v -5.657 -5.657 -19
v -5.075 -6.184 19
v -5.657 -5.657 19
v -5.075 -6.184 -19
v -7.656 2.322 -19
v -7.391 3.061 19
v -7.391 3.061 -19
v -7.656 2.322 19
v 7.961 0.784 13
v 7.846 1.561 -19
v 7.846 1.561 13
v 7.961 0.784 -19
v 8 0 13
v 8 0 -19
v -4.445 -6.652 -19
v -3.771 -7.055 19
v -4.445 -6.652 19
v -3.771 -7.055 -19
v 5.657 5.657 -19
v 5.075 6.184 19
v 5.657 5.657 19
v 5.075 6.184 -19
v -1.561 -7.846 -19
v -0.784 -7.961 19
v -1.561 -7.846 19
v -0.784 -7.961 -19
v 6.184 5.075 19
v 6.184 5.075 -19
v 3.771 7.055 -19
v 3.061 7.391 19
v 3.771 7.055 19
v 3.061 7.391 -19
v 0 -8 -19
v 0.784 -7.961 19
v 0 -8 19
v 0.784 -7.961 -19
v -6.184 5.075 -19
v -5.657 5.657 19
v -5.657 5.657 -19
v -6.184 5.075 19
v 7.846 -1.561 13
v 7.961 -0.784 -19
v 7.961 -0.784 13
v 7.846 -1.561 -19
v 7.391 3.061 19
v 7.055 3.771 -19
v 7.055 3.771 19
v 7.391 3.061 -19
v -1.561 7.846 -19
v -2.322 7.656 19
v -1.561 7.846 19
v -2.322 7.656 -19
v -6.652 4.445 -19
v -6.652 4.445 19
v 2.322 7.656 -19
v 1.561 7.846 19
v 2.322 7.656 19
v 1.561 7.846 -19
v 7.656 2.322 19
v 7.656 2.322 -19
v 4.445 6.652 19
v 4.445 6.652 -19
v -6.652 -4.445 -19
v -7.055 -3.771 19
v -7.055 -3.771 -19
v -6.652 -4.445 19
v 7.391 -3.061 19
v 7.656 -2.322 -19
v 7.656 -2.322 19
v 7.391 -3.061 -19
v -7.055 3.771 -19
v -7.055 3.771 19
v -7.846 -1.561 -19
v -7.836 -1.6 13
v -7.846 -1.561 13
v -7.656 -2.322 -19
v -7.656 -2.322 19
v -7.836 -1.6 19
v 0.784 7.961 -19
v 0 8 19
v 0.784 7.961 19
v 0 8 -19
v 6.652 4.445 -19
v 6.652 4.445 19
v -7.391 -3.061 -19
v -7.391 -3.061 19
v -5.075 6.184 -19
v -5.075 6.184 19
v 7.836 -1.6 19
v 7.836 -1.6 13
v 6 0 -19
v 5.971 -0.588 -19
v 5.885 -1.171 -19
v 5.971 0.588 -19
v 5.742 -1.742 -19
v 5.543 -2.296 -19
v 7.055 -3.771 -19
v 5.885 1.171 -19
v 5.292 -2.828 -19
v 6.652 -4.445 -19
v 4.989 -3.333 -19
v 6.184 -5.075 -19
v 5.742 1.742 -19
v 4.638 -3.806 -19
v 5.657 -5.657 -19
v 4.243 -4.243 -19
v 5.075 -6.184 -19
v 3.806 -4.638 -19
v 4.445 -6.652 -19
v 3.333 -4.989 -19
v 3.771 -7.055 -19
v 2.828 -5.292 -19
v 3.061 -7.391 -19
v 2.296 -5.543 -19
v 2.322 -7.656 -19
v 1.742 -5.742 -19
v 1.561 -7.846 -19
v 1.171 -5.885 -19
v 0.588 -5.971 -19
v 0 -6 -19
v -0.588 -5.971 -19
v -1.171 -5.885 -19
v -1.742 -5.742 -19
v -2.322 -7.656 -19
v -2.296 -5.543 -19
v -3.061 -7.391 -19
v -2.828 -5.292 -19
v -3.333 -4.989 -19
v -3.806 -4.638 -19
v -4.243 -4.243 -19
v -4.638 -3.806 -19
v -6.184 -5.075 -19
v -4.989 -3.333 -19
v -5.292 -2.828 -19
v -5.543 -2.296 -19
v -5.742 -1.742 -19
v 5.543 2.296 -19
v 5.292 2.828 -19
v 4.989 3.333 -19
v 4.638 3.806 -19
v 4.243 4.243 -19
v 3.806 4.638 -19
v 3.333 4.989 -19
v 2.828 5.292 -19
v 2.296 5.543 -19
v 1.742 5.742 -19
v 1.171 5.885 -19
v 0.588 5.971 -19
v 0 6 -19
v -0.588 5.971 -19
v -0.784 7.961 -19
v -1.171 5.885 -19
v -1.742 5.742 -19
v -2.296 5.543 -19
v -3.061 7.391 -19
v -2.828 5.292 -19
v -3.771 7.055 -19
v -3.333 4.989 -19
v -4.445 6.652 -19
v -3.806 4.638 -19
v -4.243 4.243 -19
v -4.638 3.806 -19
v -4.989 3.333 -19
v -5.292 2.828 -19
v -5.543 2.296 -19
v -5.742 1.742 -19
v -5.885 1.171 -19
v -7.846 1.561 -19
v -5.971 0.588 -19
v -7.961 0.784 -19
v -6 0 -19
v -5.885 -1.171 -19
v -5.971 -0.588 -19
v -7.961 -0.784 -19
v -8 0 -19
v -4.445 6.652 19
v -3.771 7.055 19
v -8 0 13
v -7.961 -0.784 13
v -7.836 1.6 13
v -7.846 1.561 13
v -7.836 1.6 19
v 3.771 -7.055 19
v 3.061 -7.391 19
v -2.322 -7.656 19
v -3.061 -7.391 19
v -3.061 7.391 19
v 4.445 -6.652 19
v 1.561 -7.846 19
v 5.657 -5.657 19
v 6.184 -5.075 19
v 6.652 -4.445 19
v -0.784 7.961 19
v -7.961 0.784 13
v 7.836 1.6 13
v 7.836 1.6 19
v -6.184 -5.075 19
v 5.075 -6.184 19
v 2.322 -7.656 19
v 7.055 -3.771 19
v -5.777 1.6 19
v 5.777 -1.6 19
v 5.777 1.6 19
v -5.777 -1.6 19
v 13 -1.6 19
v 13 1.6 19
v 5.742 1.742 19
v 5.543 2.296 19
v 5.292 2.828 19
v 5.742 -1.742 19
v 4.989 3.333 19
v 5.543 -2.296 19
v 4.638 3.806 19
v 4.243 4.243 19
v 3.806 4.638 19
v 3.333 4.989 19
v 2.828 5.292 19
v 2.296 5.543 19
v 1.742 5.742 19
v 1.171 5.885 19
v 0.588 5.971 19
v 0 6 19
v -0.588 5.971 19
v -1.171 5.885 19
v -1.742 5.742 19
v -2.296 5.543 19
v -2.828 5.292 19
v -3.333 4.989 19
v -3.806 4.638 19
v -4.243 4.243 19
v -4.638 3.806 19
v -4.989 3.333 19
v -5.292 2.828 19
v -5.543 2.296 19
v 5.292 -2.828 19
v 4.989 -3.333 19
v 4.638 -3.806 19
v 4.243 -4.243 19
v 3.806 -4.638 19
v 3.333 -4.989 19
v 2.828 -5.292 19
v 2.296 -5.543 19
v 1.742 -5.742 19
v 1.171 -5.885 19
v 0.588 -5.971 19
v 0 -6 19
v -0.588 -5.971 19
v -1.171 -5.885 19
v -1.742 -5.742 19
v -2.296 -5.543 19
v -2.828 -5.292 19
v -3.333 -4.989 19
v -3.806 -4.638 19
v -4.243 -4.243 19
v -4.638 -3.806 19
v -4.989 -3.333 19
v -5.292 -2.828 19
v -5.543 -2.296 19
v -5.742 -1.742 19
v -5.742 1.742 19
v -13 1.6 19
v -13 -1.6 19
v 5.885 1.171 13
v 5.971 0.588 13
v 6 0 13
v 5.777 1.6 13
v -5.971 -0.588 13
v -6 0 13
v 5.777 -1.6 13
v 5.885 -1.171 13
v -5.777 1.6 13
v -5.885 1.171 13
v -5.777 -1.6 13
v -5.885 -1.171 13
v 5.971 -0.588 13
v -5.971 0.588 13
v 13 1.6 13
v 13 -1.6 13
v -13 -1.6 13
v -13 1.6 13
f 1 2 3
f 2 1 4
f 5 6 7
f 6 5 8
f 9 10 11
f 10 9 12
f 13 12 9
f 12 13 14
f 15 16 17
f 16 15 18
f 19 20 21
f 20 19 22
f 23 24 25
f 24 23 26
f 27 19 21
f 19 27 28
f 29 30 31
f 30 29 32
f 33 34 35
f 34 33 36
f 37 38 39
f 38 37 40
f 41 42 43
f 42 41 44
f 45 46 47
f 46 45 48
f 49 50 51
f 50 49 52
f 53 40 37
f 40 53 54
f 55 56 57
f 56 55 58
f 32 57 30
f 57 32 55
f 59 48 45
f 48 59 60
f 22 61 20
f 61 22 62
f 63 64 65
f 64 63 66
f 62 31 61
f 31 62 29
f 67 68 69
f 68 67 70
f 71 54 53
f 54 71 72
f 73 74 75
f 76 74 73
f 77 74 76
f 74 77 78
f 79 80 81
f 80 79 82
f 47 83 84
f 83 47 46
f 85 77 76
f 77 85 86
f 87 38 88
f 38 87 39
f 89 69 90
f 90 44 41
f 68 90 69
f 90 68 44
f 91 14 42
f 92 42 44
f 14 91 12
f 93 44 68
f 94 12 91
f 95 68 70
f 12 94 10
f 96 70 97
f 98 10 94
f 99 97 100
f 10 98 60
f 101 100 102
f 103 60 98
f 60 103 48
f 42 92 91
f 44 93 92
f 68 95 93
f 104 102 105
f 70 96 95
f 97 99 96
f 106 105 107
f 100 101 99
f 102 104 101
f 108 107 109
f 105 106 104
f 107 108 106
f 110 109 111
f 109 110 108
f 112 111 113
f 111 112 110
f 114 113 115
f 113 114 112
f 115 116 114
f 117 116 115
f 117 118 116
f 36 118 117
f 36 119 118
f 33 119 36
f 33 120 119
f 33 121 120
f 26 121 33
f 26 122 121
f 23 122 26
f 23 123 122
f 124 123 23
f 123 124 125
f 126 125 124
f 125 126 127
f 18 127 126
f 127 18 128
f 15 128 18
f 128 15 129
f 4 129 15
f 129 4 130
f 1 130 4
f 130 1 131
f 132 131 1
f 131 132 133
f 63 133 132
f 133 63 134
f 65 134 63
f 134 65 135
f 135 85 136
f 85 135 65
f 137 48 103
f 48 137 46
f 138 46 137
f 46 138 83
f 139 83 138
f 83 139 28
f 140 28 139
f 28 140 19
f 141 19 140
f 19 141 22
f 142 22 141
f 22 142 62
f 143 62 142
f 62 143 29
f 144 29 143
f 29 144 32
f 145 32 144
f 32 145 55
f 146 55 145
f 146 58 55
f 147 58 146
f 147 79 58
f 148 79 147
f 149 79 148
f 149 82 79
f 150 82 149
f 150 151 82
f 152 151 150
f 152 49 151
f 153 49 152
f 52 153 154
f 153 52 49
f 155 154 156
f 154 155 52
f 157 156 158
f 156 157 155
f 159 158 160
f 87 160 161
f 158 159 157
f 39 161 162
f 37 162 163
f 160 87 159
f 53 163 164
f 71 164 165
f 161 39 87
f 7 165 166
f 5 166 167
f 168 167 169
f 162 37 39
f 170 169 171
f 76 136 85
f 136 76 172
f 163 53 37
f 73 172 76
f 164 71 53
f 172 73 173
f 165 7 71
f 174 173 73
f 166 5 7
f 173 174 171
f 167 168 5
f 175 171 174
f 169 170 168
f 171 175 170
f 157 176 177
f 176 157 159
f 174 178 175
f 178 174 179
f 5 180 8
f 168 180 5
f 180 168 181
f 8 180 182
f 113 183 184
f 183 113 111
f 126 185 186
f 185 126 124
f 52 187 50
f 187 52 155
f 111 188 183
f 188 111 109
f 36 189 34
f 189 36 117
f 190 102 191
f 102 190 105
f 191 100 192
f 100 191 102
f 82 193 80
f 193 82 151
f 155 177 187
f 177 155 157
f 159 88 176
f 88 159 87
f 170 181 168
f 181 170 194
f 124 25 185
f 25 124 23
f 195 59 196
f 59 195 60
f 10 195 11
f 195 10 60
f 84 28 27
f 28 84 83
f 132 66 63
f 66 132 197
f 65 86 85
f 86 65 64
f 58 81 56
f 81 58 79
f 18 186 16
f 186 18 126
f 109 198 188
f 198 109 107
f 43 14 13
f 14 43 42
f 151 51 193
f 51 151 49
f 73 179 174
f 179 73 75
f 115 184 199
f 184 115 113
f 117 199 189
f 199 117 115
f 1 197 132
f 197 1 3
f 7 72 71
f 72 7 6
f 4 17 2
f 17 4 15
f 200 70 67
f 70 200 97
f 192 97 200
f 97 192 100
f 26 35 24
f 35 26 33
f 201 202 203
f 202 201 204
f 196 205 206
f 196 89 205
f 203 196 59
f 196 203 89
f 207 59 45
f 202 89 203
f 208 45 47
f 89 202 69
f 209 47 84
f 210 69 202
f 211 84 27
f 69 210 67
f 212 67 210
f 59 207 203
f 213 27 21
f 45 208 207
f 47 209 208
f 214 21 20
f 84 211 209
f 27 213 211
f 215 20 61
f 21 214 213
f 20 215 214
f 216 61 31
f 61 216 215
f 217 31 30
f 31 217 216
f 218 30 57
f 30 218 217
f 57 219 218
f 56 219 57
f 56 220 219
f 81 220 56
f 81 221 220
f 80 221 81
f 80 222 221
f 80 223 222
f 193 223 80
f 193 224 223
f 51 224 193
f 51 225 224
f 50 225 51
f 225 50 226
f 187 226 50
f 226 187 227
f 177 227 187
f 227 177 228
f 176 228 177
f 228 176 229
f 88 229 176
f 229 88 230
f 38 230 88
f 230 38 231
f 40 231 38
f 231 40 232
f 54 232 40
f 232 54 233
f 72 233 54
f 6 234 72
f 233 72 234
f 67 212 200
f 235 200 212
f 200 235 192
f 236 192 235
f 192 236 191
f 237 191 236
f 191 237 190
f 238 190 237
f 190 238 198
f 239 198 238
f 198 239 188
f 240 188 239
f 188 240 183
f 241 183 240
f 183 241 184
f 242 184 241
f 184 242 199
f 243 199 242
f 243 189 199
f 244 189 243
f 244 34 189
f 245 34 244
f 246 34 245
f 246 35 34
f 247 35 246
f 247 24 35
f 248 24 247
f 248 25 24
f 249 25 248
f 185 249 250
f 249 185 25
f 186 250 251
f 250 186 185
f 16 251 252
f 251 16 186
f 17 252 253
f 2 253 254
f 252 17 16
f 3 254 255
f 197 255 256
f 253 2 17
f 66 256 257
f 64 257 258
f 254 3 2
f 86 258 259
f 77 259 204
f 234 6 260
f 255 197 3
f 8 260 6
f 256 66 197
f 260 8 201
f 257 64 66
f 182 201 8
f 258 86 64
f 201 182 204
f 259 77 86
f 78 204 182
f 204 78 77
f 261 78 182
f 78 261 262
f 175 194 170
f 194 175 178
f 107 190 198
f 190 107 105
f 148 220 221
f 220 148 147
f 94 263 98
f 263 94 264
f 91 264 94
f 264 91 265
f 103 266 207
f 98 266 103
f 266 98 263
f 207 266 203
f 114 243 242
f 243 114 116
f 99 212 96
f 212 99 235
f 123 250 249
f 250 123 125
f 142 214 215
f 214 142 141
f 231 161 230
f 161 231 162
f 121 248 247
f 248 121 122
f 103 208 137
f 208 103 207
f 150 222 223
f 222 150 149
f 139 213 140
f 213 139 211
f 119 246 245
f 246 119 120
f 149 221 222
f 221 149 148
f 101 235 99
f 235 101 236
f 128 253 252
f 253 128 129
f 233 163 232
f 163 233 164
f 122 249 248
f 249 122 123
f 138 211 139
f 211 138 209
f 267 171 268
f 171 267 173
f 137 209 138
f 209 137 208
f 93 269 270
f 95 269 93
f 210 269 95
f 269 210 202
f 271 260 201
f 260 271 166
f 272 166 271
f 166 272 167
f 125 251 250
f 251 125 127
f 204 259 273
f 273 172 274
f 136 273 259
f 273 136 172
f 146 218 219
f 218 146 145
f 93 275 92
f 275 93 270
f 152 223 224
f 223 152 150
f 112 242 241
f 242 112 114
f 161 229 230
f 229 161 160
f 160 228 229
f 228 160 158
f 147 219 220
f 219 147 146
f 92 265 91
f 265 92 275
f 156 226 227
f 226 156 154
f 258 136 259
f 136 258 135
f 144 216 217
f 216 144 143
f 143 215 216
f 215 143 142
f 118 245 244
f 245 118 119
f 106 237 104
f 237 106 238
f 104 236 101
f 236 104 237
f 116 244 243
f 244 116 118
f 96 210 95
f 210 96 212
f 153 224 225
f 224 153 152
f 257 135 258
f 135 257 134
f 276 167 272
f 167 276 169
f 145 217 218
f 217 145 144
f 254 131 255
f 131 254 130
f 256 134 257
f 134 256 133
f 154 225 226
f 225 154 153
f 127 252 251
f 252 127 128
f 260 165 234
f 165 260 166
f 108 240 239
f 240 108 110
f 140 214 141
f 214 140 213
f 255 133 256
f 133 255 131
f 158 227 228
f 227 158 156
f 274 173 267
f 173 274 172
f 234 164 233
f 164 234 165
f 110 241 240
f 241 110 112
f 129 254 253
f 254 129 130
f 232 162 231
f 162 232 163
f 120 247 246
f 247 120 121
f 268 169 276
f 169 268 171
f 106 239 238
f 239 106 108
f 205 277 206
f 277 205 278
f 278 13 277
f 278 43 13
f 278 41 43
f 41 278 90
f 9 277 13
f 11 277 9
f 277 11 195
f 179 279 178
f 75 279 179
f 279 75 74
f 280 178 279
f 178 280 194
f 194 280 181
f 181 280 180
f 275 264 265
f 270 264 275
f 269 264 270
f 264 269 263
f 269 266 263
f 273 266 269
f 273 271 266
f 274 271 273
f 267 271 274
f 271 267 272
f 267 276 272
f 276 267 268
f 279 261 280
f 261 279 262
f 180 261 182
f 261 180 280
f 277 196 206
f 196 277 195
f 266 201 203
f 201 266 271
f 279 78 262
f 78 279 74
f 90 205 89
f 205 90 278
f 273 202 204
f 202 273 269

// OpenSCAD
// Prism optical tunnel
$fn = 64;

tunnel_length = 38;
tunnel_diameter = 12;

module tunnel() {
    difference() {
        cylinder(h = tunnel_length, d = tunnel_diameter + 4, center = true);
        cylinder(h = tunnel_length + 1, d = tunnel_diameter, center = true);
    }
}

module cassette_slot() {
    translate([0, 0, tunnel_length / 2 - 3])
        cube([26, 3.2, 6], center = true);
}

tunnel();
cassette_slot();
